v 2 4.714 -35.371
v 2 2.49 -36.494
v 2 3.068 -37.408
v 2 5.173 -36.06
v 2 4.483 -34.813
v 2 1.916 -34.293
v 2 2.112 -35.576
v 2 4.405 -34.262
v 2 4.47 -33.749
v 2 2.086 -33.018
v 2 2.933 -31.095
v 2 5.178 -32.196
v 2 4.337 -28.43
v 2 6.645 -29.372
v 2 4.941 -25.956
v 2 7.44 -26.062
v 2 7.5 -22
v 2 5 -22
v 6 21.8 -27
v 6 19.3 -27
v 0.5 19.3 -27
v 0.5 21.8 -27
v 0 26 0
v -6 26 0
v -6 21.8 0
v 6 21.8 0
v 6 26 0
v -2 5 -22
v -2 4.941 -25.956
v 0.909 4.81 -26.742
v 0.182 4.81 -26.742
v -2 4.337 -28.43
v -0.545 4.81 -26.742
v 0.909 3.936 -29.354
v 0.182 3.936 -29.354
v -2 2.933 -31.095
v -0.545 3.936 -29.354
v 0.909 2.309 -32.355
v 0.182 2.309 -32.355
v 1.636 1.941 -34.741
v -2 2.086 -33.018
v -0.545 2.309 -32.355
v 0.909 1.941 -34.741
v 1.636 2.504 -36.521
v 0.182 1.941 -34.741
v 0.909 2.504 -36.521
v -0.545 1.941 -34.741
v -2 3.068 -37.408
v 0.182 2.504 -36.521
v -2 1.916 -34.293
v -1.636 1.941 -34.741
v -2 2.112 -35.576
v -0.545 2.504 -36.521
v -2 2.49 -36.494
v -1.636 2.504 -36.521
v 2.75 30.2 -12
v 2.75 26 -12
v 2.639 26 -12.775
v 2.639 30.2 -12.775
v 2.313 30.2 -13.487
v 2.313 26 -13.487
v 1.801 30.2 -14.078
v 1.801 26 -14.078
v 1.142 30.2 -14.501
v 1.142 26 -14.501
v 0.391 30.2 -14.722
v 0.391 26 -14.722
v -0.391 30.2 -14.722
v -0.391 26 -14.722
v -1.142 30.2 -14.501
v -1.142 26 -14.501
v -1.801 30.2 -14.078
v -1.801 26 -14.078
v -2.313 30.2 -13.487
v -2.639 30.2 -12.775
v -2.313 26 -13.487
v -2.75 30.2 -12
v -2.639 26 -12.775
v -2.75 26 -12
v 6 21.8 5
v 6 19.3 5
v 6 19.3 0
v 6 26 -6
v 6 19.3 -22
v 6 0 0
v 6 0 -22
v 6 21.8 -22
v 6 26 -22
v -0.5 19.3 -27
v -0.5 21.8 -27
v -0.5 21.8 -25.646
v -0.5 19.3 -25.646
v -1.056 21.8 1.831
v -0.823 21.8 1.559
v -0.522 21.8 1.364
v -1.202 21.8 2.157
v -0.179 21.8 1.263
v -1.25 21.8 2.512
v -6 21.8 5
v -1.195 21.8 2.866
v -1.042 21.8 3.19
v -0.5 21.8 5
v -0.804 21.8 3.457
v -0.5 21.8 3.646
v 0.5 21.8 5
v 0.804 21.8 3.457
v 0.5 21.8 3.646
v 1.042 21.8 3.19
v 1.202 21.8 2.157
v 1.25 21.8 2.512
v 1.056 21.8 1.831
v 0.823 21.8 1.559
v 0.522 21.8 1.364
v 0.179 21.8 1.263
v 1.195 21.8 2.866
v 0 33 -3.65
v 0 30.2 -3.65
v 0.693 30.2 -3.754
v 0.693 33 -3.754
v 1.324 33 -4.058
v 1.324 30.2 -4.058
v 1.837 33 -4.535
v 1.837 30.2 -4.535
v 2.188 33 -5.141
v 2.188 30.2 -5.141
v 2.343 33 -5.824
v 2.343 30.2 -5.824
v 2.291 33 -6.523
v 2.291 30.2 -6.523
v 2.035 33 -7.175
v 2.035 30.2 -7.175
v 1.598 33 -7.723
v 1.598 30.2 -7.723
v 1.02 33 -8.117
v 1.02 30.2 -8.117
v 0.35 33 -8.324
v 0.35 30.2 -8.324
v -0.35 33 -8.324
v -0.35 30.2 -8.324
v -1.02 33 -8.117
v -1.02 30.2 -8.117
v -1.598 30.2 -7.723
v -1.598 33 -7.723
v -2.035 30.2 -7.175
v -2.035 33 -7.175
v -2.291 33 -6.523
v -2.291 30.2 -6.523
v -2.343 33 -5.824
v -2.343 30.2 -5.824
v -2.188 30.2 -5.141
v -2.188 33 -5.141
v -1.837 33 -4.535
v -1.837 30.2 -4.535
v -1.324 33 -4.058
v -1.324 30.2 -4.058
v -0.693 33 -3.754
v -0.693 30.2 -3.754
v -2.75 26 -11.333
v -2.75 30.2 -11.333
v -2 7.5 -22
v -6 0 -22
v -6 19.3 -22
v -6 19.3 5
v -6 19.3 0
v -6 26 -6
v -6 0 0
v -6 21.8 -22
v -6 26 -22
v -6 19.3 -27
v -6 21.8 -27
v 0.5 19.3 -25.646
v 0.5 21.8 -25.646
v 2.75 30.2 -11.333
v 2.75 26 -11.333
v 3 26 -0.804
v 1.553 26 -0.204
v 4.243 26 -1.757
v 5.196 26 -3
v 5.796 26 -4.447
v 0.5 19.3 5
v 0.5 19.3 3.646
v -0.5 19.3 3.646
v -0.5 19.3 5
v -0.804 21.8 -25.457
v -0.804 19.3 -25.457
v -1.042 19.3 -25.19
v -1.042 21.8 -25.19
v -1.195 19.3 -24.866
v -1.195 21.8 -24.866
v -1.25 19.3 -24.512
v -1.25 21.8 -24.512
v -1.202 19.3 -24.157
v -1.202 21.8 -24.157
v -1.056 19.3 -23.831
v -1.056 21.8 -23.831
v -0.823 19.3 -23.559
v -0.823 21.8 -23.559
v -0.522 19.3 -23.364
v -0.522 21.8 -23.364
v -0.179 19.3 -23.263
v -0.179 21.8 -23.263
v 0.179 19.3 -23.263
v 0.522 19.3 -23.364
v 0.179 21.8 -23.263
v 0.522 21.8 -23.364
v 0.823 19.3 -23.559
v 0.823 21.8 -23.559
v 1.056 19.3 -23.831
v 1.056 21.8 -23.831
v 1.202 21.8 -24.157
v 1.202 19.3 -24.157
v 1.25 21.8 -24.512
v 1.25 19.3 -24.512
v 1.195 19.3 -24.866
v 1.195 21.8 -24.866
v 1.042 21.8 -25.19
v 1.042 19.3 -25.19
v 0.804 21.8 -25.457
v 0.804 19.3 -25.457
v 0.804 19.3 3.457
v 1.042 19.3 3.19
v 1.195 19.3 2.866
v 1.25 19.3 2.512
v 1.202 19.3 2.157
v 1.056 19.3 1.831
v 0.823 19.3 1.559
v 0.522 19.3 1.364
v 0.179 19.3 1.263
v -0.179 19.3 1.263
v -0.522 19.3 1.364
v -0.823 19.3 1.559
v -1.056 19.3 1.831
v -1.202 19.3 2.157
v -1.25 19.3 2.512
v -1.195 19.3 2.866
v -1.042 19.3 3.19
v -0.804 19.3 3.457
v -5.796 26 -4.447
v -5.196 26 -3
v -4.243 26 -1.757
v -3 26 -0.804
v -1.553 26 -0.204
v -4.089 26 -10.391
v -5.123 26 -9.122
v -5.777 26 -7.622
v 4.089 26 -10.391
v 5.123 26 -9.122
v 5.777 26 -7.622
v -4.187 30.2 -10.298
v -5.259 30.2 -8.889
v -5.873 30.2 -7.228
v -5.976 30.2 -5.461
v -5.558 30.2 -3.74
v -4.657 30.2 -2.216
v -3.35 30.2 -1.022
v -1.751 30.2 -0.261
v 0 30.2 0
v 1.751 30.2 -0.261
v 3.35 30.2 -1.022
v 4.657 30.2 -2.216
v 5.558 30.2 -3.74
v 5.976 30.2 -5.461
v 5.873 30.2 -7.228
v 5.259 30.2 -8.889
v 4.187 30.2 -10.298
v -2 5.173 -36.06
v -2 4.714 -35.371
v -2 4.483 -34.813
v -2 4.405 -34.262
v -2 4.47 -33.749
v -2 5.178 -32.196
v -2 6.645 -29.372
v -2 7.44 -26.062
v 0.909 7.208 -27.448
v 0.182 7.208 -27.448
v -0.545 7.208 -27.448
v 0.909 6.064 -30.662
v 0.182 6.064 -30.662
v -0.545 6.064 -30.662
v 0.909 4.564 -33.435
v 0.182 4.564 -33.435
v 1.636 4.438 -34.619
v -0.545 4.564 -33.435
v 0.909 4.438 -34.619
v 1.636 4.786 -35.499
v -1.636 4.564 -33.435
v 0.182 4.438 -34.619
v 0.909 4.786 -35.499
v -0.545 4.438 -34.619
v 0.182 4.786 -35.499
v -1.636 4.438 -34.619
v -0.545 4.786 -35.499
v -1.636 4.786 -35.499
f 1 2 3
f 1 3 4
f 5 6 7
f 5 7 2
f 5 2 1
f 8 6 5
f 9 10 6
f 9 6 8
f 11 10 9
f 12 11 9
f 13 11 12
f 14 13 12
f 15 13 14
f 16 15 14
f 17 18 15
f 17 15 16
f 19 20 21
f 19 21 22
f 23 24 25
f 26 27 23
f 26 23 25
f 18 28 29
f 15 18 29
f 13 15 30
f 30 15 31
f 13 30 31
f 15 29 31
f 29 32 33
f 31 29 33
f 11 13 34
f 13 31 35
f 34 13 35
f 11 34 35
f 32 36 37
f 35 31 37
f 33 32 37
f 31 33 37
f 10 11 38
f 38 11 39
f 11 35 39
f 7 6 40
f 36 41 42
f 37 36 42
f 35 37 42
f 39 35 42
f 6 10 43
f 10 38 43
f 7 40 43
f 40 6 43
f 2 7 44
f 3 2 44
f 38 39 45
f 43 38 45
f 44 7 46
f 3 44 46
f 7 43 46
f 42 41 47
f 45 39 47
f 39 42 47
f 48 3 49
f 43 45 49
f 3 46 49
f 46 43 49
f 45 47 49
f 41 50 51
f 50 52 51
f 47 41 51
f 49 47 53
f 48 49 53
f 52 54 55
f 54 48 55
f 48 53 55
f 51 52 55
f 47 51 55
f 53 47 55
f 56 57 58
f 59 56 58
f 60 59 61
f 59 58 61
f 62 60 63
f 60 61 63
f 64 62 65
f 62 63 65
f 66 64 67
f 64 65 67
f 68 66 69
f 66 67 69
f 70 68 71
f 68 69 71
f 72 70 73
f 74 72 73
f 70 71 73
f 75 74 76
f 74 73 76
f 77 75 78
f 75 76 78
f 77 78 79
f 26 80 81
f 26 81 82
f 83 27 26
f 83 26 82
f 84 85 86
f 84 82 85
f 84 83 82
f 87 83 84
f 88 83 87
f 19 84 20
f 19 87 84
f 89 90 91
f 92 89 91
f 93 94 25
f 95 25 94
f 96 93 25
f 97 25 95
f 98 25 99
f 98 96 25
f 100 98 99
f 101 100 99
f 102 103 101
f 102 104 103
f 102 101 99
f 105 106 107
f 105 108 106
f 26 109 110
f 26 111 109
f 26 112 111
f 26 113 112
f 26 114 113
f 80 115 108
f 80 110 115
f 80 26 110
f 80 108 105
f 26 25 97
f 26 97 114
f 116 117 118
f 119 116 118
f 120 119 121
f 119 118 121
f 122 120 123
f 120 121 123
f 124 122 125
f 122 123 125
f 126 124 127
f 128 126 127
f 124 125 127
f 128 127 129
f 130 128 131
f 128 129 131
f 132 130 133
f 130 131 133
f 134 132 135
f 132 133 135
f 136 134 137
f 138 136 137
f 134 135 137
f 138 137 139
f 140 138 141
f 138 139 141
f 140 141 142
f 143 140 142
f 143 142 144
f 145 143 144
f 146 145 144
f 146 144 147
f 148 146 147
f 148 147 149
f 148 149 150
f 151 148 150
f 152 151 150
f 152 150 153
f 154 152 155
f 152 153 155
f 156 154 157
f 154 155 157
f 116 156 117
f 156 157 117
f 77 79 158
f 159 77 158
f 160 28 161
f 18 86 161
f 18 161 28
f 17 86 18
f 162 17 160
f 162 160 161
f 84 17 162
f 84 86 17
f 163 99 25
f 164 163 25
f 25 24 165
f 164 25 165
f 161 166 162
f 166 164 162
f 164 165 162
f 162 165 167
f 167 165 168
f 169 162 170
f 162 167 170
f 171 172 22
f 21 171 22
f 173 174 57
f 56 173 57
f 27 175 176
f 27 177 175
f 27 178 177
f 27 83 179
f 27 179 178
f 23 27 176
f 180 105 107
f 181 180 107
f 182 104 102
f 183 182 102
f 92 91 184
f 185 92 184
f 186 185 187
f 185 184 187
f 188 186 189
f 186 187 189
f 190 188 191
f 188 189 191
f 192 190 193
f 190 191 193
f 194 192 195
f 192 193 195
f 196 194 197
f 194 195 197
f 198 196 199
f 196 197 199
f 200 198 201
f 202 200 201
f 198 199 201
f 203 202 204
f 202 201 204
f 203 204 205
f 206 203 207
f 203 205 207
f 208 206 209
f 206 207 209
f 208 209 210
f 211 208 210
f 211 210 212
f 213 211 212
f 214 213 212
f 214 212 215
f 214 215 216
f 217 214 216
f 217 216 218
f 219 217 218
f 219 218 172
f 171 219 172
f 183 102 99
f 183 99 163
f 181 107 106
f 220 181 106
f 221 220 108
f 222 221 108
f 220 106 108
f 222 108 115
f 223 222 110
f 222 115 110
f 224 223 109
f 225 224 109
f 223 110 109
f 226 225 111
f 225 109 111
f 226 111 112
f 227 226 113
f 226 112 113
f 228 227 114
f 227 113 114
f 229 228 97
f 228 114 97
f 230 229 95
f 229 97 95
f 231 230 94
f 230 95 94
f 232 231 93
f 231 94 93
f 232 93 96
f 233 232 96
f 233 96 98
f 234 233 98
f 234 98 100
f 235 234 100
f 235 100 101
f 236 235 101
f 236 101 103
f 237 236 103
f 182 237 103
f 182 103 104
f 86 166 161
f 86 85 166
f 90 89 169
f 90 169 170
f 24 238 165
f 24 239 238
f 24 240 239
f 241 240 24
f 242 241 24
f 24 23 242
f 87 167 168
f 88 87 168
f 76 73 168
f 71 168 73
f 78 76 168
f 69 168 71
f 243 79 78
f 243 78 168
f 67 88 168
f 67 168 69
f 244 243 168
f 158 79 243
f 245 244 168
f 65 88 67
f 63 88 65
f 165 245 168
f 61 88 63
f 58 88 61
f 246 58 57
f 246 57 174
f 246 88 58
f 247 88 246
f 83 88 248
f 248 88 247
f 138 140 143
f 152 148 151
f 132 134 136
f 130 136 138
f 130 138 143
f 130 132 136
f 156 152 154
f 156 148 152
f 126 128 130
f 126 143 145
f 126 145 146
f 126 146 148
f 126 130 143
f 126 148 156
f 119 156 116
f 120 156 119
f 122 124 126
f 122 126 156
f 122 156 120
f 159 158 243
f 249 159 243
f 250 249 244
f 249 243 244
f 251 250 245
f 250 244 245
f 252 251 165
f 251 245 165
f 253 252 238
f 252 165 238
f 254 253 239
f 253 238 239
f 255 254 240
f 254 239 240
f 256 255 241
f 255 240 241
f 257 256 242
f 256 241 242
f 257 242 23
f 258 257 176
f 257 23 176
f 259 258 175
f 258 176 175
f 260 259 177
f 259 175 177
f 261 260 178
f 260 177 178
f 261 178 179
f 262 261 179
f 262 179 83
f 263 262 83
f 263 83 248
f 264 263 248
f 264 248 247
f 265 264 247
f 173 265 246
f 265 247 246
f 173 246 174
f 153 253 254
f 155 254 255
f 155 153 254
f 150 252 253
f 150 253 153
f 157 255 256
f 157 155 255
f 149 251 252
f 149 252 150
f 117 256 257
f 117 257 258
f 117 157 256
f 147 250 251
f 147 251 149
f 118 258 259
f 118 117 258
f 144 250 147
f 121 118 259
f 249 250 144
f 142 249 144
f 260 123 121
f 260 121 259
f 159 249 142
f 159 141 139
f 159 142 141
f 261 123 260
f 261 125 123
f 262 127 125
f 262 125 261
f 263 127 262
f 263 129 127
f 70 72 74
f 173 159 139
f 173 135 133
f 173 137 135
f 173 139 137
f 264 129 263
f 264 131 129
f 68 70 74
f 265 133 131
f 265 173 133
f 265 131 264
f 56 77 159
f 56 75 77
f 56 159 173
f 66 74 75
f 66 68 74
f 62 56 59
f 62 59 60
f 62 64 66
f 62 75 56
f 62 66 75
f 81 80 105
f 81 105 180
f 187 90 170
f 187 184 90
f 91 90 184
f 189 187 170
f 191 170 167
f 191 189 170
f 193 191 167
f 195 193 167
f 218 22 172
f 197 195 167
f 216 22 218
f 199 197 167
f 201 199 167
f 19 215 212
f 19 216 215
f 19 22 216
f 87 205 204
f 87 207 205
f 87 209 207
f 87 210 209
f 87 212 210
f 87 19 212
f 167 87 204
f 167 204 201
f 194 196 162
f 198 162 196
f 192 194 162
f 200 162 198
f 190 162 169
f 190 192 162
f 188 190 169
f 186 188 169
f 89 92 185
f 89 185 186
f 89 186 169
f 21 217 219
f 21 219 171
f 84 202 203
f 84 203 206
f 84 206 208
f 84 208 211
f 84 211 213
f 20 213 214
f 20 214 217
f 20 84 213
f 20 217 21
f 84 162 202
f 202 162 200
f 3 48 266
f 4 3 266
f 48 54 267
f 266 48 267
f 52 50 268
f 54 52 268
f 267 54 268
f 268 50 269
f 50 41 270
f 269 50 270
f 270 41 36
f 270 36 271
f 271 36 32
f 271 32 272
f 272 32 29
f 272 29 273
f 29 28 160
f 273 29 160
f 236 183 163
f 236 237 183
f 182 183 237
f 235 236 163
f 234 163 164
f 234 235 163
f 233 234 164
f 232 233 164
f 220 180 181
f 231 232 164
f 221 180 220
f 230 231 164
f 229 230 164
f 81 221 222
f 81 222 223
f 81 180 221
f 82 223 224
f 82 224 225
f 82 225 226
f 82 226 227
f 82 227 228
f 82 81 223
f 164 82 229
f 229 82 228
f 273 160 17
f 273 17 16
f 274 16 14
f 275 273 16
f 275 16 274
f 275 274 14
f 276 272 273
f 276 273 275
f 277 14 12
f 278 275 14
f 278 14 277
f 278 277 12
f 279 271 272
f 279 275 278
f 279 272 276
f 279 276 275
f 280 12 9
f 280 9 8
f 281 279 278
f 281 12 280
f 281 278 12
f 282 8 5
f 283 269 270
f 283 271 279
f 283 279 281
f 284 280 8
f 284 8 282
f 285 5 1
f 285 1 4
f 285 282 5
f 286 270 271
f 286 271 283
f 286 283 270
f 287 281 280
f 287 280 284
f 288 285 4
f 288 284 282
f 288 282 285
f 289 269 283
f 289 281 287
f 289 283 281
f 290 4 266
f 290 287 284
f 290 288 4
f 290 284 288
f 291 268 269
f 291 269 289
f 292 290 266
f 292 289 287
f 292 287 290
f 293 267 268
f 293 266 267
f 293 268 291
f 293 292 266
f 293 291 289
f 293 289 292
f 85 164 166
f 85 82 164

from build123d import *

# Parameters (mm, degrees)
EXTRUDE_1_DEPTH     = 6
EXTRUDE_2_DEPTH     = 4.2
SKETCH_3_R          = 2.35
EXTRUDE_3_DEPTH     = 2.8
SWEEP_START         = -2
SWEEP_1_DEPTH       = 4
CUT_EXTRUDE_1_DEPTH = 3


# Read off the part's stored shape, not the designer's step: По траектории1
with BuildPart() as part:
    # Эскиз1 → Бобышка-Вытянуть1 (new, symmetric)
    with BuildSketch(Plane(origin=(0, 0, 0), x_dir=(0, 0, -1), z_dir=(1, 0, 0))):
        Polygon((0, 0), (22, 0), (22, 19.3), (27, 19.3), (27, 21.8), (22, 21.8), (22, 26), (0, 26), (0, 21.8), (-5, 21.8), (-5, 19.3), (0, 19.3), align=None)
    extrude(amount=EXTRUDE_1_DEPTH, both=True)

    # Эскиз2 → Бобышка-Вытянуть2 (add)
    with BuildSketch(Plane(origin=(0, 26, 0), x_dir=(1, 0, 0), z_dir=(0, 1, 0))):
        with BuildLine():
            Line((-2.75, 12), (-2.75, 11.332682252))
            ThreePointArc((-2.75, 11.332682252), (0, 0), (2.75, 11.332682252))
            Line((2.75, 11.332682252), (2.75, 12))
            ThreePointArc((2.75, 12), (0, 14.75), (-2.75, 12))
        make_face()
    extrude(amount=EXTRUDE_2_DEPTH)

    # Эскиз3 → Бобышка-Вытянуть3 (add)
    with BuildSketch(Plane(origin=(0, 30.2, 0), x_dir=(1, 0, 0), z_dir=(0, 1, 0))):
        with Locations(Location((0, 6, 0), (0, 0, 270))):
            Circle(SKETCH_3_R)
    extrude(amount=EXTRUDE_3_DEPTH)

    # По траектории1 outline → По траектории1 (add)
    with BuildSketch(Plane.YZ.offset(SWEEP_START)):
        with BuildLine():
            Line((7.5, -22), (5, -22))
            add(Edge.make_bspline(
                [(5, -22), (5.069741994, -22.788251561), (5.125958635, -24.404153677), (4.878573381, -26.772120173), (4.395772619, -28.378294328), (3.83166606, -29.588406839), (3.21879889, -30.61604033), (2.403361035, -31.959681467), (1.936450048, -33.447187834), (1.879246473, -34.586937516), (2.09656871, -35.628227488), (2.472597261, -36.523725644), (2.84782964, -37.107918611), (3.067609014, -37.407797225)],
                knots=[0, 0, 0, 0, 0.166666667, 0.333333333, 0.5, 0.534253468, 0.625, 0.75, 0.8125, 0.875, 0.916666667, 0.958333333, 1, 1, 1, 1], degree=3))
            Line((3.067609014, -37.407797225), (5.173227765, -36.060069628))
            add(Edge.make_bspline(
                [(7.5, -22), (7.567173372, -22.882492449), (7.618252767, -24.686876341), (7.299304344, -27.455245749), (6.663696491, -29.460064755), (5.924563706, -30.955136787), (5.18985295, -32.152025941), (4.582294135, -33.24339685), (4.389602767, -34.062522123), (4.406362916, -34.546823904), (4.535371286, -35.013924669), (4.759350216, -35.482390845), (5.013826459, -35.862321947), (5.173227765, -36.060069628)],
                knots=[0, 0, 0, 0, 0.166666667, 0.333333333, 0.5, 0.534253468, 0.625, 0.75, 0.8125, 0.875, 0.916666667, 0.958333333, 1, 1, 1, 1], degree=3))
        make_face()
    extrude(amount=SWEEP_1_DEPTH)

    # Эскиз6 → Вырез-Вытянуть1 (cut)
    with BuildSketch(Plane(origin=(0, 21.8, 0), x_dir=(1, 0, 0), z_dir=(0, 1, 0))):
        with BuildLine():
            Line((-0.5, 27), (-0.5, 25.645643924))
            ThreePointArc((-0.5, 25.645643924), (0, 23.25), (0.5, 25.645643924))
            Line((0.5, 25.645643924), (0.5, 27))
            Line((0.5, 27), (0, 27))
            Line((0, 27), (-0.5, 27))
        make_face()
        with BuildLine():
            Line((0.5, -5), (0.5, -3.645643924))
            ThreePointArc((0.5, -3.645643924), (0, -1.25), (-0.5, -3.645643924))
            Line((-0.5, -3.645643924), (-0.5, -5))
            Line((-0.5, -5), (0, -5))
            Line((0, -5), (0.5, -5))
        make_face()
    extrude(amount=-CUT_EXTRUDE_1_DEPTH, mode=Mode.SUBTRACT)


solid = part.part
